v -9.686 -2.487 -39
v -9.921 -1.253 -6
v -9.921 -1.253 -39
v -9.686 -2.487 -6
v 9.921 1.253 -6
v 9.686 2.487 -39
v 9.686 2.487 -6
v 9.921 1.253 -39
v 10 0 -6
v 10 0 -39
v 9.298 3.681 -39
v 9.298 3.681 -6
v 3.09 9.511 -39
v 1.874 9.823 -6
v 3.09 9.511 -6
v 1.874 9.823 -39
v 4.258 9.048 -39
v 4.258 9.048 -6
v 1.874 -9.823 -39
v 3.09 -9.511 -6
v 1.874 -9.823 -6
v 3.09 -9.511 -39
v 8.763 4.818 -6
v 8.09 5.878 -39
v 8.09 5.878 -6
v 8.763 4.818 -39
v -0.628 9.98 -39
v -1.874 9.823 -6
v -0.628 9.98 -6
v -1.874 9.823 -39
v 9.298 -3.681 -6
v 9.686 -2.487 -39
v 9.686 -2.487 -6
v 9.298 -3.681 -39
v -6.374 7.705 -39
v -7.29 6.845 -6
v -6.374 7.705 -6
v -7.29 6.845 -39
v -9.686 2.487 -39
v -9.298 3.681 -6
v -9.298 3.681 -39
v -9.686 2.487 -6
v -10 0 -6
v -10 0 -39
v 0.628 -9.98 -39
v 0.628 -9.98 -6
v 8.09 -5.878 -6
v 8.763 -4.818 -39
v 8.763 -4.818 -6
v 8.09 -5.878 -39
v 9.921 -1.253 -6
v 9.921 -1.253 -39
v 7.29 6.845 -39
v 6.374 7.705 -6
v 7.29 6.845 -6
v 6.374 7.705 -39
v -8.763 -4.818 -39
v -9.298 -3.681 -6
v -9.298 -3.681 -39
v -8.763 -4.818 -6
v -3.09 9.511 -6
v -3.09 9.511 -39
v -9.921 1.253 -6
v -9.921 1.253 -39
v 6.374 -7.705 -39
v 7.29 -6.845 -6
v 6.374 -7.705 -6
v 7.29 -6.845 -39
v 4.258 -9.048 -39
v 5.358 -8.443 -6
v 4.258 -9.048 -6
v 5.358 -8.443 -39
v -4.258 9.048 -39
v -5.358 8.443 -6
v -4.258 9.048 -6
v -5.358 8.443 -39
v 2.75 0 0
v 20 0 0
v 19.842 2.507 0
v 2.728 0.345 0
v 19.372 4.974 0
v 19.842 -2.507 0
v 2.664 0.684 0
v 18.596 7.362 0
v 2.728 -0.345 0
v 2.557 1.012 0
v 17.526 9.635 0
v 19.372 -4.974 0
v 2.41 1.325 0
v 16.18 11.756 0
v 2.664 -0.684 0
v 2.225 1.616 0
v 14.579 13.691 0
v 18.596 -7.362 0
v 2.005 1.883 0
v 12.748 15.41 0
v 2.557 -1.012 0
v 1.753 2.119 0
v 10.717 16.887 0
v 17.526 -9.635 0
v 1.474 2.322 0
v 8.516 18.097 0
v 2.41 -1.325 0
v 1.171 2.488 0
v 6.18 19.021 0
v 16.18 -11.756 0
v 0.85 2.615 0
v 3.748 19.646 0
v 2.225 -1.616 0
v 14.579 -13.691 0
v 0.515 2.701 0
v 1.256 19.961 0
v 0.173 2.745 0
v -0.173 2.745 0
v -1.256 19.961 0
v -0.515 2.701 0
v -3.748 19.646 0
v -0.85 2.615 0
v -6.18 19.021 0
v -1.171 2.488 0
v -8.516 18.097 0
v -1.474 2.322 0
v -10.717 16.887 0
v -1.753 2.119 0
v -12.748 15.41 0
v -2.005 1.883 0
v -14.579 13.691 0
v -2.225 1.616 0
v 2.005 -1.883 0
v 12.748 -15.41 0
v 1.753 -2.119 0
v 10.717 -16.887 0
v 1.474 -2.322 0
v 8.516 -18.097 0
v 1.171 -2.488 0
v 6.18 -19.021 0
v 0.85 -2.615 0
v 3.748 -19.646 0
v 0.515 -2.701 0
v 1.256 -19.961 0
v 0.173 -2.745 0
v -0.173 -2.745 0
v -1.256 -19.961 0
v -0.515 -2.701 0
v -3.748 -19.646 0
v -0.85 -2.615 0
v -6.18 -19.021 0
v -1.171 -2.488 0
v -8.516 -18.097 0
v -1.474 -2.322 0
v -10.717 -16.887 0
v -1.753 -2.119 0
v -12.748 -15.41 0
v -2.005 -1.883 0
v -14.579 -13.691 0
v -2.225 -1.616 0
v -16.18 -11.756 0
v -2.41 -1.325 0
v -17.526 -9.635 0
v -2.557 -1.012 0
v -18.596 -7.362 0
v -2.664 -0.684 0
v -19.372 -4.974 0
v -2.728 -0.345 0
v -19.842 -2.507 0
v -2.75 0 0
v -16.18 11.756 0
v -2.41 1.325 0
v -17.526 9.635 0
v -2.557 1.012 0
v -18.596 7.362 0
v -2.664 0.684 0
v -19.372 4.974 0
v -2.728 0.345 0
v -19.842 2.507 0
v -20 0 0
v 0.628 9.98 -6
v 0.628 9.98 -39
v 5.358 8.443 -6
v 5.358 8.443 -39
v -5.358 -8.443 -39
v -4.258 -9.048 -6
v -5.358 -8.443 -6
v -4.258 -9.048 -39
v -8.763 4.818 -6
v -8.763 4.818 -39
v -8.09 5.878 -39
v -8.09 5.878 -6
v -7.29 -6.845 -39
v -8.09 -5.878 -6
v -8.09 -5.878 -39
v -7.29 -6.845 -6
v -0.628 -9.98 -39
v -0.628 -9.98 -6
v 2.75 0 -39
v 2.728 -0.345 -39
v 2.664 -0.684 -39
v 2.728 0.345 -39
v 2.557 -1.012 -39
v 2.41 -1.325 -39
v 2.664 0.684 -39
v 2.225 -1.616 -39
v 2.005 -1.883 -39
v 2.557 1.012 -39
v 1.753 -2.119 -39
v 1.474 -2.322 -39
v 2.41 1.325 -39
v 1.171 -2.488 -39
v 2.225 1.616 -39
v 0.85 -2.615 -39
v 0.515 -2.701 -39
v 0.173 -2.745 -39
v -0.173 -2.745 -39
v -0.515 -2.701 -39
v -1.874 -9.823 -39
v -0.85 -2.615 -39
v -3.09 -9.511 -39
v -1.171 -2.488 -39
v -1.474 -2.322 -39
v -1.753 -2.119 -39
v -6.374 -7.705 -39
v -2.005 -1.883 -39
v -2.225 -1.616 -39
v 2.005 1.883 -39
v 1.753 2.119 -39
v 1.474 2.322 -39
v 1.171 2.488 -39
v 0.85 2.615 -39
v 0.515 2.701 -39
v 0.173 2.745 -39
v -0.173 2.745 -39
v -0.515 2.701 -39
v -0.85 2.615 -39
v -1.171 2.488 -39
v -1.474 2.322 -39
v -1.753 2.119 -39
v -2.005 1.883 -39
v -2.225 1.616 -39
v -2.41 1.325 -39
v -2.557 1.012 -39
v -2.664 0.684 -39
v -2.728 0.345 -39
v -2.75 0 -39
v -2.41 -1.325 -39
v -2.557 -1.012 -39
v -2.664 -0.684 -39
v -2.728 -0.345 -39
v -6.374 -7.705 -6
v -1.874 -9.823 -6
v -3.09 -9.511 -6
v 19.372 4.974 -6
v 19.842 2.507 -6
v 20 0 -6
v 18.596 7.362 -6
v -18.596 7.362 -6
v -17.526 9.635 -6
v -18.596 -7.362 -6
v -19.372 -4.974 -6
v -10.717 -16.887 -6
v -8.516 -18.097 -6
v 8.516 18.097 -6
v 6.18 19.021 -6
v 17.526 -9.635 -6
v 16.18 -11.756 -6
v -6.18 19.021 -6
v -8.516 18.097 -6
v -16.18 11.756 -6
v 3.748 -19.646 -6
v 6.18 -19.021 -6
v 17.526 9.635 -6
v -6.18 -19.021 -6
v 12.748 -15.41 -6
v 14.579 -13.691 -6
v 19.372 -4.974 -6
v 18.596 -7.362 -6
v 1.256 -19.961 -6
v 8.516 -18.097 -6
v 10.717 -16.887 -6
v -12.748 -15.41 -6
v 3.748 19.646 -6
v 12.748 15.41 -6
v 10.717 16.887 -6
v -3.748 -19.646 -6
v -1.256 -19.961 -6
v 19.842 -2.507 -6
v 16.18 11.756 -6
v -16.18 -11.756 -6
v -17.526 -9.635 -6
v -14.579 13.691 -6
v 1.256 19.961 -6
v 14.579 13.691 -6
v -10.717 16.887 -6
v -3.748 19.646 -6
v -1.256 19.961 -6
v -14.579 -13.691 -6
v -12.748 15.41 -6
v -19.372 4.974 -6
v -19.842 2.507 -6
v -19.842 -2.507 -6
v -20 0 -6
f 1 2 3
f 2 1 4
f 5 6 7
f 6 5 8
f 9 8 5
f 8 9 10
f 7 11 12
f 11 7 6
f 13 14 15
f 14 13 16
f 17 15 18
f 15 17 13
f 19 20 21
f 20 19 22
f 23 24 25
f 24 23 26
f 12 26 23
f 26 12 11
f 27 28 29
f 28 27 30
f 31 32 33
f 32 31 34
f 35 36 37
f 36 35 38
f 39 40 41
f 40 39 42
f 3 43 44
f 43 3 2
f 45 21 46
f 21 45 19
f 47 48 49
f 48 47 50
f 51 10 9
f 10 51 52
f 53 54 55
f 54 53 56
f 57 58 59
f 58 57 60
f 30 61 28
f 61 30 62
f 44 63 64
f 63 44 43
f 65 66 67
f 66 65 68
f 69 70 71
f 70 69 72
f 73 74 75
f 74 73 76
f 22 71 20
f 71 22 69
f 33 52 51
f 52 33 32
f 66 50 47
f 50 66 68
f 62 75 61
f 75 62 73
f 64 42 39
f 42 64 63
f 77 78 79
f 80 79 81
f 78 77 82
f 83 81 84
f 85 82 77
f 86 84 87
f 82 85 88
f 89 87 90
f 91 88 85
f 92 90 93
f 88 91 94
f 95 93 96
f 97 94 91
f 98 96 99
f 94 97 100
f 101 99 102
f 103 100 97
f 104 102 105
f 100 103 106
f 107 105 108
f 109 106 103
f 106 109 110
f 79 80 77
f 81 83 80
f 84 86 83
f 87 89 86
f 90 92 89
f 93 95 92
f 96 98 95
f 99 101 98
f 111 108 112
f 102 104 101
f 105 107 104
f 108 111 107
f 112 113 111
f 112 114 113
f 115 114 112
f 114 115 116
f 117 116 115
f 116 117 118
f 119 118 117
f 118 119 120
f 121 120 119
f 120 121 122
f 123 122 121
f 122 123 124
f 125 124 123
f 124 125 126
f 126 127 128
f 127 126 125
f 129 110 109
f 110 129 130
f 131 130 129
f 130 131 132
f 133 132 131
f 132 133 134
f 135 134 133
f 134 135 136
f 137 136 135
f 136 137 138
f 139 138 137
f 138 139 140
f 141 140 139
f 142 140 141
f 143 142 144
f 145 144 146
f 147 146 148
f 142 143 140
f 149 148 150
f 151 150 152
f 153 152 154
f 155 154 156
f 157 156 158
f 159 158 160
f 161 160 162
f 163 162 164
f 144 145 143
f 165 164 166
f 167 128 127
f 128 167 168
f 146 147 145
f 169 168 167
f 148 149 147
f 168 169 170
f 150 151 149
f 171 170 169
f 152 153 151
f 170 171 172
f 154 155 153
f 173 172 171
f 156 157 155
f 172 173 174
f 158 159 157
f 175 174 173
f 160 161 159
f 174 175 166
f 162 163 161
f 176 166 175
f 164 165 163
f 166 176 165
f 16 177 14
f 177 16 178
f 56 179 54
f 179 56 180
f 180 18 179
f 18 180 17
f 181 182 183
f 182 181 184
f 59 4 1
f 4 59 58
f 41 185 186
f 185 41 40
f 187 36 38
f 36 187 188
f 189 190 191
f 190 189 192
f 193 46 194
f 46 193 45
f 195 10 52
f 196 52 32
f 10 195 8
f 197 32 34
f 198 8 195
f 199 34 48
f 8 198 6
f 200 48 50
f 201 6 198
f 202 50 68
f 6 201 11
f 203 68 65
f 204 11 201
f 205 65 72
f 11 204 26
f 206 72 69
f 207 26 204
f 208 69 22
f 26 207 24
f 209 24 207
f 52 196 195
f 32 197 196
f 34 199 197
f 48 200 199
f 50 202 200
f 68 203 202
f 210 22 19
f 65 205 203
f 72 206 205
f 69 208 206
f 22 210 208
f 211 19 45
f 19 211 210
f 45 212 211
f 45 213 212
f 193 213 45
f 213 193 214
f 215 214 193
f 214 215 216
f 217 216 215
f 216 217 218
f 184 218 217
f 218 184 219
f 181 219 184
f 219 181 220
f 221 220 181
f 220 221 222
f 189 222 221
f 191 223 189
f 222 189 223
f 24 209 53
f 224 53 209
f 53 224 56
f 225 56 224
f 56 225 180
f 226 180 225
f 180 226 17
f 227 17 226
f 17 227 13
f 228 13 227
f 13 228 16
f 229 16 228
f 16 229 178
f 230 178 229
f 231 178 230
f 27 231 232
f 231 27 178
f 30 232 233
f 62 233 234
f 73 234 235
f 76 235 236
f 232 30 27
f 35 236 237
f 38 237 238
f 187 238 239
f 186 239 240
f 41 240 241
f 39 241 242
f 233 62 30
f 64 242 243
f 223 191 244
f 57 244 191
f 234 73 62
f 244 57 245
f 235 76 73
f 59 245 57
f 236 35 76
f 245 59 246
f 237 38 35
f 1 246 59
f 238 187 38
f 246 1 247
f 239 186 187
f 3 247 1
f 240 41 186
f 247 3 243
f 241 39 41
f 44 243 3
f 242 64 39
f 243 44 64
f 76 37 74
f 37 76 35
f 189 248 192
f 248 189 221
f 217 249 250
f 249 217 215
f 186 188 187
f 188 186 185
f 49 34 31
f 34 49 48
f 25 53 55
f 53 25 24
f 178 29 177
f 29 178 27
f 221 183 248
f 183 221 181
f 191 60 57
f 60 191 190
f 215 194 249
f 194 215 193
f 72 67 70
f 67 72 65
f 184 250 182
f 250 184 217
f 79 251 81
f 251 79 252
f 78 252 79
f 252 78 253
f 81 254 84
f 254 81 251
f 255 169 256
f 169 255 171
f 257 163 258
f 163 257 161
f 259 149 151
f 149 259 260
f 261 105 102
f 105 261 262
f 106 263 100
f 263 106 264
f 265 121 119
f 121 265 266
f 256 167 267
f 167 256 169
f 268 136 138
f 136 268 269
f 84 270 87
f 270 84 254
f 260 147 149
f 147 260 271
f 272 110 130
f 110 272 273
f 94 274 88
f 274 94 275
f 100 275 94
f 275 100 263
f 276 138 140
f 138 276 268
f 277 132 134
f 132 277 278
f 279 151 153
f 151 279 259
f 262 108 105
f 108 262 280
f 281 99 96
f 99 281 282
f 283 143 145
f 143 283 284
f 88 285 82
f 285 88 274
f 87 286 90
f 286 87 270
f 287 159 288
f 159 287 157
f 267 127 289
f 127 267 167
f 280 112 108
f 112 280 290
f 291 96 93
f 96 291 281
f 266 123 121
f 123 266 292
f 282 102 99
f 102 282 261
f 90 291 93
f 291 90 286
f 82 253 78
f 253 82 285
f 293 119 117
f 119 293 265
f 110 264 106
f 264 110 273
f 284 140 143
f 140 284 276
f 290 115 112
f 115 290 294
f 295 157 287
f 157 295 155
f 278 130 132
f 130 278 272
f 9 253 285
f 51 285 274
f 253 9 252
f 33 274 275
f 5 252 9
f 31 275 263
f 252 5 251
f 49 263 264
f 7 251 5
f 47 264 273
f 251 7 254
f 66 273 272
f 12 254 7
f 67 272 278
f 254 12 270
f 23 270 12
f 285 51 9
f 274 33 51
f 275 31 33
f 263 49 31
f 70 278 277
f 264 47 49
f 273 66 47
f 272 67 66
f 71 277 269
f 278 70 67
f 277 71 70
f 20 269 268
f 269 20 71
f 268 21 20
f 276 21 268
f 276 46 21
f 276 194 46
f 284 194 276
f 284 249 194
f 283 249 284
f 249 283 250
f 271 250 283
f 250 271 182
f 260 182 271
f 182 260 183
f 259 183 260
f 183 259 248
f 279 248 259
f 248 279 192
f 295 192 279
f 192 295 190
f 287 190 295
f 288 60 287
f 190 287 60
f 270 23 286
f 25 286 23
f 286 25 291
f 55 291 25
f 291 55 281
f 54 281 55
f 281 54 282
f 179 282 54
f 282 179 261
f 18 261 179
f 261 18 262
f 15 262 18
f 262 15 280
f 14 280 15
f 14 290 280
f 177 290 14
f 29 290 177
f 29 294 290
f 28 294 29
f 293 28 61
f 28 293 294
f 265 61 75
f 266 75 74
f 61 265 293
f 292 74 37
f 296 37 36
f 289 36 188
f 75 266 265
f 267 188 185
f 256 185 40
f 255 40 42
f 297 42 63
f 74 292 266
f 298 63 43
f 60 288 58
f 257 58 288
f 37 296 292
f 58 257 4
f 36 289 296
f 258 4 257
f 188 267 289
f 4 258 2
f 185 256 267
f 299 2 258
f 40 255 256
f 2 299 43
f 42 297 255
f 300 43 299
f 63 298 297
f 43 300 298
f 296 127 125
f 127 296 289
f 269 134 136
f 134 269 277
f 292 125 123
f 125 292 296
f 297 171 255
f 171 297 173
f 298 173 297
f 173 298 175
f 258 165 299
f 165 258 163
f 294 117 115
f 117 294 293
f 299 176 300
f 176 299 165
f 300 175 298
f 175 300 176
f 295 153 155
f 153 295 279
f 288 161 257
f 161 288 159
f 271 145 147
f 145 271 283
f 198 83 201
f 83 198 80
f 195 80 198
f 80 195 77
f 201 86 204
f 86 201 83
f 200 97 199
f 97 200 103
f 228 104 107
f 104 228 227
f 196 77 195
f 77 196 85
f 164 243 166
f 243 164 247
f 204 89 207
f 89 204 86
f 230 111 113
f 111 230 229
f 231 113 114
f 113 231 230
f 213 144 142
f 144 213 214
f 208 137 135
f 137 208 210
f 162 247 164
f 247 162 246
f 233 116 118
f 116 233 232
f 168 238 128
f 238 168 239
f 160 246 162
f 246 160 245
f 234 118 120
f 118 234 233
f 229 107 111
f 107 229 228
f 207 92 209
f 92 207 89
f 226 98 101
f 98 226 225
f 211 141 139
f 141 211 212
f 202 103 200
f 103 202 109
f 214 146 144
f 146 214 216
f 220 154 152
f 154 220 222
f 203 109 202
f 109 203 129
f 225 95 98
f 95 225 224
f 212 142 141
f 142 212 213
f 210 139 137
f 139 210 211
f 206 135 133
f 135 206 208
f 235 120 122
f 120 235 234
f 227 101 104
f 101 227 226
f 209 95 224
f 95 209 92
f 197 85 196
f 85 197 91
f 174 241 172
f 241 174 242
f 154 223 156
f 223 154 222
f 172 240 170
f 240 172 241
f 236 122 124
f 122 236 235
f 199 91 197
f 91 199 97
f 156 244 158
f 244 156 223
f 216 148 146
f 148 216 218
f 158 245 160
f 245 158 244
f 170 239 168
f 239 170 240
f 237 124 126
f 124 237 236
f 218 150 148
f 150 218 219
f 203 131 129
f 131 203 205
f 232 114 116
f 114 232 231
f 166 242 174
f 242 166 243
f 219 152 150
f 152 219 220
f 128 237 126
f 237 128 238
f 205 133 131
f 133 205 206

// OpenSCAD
$fn = 50;


difference() {
	union() {
		translate(v = [0, 0, -39.0000000000]) {
			cylinder(h = 39, r = 10.0000000000);
		}
		translate(v = [0, 0, -6.0000000000]) {
			cylinder(h = 6, r = 20.0000000000);
		}
	}
	union() {
		#translate(v = [0, 0, -39]) {
			cylinder(h = 39, r = 2.7500000000);
		}
	}
}
